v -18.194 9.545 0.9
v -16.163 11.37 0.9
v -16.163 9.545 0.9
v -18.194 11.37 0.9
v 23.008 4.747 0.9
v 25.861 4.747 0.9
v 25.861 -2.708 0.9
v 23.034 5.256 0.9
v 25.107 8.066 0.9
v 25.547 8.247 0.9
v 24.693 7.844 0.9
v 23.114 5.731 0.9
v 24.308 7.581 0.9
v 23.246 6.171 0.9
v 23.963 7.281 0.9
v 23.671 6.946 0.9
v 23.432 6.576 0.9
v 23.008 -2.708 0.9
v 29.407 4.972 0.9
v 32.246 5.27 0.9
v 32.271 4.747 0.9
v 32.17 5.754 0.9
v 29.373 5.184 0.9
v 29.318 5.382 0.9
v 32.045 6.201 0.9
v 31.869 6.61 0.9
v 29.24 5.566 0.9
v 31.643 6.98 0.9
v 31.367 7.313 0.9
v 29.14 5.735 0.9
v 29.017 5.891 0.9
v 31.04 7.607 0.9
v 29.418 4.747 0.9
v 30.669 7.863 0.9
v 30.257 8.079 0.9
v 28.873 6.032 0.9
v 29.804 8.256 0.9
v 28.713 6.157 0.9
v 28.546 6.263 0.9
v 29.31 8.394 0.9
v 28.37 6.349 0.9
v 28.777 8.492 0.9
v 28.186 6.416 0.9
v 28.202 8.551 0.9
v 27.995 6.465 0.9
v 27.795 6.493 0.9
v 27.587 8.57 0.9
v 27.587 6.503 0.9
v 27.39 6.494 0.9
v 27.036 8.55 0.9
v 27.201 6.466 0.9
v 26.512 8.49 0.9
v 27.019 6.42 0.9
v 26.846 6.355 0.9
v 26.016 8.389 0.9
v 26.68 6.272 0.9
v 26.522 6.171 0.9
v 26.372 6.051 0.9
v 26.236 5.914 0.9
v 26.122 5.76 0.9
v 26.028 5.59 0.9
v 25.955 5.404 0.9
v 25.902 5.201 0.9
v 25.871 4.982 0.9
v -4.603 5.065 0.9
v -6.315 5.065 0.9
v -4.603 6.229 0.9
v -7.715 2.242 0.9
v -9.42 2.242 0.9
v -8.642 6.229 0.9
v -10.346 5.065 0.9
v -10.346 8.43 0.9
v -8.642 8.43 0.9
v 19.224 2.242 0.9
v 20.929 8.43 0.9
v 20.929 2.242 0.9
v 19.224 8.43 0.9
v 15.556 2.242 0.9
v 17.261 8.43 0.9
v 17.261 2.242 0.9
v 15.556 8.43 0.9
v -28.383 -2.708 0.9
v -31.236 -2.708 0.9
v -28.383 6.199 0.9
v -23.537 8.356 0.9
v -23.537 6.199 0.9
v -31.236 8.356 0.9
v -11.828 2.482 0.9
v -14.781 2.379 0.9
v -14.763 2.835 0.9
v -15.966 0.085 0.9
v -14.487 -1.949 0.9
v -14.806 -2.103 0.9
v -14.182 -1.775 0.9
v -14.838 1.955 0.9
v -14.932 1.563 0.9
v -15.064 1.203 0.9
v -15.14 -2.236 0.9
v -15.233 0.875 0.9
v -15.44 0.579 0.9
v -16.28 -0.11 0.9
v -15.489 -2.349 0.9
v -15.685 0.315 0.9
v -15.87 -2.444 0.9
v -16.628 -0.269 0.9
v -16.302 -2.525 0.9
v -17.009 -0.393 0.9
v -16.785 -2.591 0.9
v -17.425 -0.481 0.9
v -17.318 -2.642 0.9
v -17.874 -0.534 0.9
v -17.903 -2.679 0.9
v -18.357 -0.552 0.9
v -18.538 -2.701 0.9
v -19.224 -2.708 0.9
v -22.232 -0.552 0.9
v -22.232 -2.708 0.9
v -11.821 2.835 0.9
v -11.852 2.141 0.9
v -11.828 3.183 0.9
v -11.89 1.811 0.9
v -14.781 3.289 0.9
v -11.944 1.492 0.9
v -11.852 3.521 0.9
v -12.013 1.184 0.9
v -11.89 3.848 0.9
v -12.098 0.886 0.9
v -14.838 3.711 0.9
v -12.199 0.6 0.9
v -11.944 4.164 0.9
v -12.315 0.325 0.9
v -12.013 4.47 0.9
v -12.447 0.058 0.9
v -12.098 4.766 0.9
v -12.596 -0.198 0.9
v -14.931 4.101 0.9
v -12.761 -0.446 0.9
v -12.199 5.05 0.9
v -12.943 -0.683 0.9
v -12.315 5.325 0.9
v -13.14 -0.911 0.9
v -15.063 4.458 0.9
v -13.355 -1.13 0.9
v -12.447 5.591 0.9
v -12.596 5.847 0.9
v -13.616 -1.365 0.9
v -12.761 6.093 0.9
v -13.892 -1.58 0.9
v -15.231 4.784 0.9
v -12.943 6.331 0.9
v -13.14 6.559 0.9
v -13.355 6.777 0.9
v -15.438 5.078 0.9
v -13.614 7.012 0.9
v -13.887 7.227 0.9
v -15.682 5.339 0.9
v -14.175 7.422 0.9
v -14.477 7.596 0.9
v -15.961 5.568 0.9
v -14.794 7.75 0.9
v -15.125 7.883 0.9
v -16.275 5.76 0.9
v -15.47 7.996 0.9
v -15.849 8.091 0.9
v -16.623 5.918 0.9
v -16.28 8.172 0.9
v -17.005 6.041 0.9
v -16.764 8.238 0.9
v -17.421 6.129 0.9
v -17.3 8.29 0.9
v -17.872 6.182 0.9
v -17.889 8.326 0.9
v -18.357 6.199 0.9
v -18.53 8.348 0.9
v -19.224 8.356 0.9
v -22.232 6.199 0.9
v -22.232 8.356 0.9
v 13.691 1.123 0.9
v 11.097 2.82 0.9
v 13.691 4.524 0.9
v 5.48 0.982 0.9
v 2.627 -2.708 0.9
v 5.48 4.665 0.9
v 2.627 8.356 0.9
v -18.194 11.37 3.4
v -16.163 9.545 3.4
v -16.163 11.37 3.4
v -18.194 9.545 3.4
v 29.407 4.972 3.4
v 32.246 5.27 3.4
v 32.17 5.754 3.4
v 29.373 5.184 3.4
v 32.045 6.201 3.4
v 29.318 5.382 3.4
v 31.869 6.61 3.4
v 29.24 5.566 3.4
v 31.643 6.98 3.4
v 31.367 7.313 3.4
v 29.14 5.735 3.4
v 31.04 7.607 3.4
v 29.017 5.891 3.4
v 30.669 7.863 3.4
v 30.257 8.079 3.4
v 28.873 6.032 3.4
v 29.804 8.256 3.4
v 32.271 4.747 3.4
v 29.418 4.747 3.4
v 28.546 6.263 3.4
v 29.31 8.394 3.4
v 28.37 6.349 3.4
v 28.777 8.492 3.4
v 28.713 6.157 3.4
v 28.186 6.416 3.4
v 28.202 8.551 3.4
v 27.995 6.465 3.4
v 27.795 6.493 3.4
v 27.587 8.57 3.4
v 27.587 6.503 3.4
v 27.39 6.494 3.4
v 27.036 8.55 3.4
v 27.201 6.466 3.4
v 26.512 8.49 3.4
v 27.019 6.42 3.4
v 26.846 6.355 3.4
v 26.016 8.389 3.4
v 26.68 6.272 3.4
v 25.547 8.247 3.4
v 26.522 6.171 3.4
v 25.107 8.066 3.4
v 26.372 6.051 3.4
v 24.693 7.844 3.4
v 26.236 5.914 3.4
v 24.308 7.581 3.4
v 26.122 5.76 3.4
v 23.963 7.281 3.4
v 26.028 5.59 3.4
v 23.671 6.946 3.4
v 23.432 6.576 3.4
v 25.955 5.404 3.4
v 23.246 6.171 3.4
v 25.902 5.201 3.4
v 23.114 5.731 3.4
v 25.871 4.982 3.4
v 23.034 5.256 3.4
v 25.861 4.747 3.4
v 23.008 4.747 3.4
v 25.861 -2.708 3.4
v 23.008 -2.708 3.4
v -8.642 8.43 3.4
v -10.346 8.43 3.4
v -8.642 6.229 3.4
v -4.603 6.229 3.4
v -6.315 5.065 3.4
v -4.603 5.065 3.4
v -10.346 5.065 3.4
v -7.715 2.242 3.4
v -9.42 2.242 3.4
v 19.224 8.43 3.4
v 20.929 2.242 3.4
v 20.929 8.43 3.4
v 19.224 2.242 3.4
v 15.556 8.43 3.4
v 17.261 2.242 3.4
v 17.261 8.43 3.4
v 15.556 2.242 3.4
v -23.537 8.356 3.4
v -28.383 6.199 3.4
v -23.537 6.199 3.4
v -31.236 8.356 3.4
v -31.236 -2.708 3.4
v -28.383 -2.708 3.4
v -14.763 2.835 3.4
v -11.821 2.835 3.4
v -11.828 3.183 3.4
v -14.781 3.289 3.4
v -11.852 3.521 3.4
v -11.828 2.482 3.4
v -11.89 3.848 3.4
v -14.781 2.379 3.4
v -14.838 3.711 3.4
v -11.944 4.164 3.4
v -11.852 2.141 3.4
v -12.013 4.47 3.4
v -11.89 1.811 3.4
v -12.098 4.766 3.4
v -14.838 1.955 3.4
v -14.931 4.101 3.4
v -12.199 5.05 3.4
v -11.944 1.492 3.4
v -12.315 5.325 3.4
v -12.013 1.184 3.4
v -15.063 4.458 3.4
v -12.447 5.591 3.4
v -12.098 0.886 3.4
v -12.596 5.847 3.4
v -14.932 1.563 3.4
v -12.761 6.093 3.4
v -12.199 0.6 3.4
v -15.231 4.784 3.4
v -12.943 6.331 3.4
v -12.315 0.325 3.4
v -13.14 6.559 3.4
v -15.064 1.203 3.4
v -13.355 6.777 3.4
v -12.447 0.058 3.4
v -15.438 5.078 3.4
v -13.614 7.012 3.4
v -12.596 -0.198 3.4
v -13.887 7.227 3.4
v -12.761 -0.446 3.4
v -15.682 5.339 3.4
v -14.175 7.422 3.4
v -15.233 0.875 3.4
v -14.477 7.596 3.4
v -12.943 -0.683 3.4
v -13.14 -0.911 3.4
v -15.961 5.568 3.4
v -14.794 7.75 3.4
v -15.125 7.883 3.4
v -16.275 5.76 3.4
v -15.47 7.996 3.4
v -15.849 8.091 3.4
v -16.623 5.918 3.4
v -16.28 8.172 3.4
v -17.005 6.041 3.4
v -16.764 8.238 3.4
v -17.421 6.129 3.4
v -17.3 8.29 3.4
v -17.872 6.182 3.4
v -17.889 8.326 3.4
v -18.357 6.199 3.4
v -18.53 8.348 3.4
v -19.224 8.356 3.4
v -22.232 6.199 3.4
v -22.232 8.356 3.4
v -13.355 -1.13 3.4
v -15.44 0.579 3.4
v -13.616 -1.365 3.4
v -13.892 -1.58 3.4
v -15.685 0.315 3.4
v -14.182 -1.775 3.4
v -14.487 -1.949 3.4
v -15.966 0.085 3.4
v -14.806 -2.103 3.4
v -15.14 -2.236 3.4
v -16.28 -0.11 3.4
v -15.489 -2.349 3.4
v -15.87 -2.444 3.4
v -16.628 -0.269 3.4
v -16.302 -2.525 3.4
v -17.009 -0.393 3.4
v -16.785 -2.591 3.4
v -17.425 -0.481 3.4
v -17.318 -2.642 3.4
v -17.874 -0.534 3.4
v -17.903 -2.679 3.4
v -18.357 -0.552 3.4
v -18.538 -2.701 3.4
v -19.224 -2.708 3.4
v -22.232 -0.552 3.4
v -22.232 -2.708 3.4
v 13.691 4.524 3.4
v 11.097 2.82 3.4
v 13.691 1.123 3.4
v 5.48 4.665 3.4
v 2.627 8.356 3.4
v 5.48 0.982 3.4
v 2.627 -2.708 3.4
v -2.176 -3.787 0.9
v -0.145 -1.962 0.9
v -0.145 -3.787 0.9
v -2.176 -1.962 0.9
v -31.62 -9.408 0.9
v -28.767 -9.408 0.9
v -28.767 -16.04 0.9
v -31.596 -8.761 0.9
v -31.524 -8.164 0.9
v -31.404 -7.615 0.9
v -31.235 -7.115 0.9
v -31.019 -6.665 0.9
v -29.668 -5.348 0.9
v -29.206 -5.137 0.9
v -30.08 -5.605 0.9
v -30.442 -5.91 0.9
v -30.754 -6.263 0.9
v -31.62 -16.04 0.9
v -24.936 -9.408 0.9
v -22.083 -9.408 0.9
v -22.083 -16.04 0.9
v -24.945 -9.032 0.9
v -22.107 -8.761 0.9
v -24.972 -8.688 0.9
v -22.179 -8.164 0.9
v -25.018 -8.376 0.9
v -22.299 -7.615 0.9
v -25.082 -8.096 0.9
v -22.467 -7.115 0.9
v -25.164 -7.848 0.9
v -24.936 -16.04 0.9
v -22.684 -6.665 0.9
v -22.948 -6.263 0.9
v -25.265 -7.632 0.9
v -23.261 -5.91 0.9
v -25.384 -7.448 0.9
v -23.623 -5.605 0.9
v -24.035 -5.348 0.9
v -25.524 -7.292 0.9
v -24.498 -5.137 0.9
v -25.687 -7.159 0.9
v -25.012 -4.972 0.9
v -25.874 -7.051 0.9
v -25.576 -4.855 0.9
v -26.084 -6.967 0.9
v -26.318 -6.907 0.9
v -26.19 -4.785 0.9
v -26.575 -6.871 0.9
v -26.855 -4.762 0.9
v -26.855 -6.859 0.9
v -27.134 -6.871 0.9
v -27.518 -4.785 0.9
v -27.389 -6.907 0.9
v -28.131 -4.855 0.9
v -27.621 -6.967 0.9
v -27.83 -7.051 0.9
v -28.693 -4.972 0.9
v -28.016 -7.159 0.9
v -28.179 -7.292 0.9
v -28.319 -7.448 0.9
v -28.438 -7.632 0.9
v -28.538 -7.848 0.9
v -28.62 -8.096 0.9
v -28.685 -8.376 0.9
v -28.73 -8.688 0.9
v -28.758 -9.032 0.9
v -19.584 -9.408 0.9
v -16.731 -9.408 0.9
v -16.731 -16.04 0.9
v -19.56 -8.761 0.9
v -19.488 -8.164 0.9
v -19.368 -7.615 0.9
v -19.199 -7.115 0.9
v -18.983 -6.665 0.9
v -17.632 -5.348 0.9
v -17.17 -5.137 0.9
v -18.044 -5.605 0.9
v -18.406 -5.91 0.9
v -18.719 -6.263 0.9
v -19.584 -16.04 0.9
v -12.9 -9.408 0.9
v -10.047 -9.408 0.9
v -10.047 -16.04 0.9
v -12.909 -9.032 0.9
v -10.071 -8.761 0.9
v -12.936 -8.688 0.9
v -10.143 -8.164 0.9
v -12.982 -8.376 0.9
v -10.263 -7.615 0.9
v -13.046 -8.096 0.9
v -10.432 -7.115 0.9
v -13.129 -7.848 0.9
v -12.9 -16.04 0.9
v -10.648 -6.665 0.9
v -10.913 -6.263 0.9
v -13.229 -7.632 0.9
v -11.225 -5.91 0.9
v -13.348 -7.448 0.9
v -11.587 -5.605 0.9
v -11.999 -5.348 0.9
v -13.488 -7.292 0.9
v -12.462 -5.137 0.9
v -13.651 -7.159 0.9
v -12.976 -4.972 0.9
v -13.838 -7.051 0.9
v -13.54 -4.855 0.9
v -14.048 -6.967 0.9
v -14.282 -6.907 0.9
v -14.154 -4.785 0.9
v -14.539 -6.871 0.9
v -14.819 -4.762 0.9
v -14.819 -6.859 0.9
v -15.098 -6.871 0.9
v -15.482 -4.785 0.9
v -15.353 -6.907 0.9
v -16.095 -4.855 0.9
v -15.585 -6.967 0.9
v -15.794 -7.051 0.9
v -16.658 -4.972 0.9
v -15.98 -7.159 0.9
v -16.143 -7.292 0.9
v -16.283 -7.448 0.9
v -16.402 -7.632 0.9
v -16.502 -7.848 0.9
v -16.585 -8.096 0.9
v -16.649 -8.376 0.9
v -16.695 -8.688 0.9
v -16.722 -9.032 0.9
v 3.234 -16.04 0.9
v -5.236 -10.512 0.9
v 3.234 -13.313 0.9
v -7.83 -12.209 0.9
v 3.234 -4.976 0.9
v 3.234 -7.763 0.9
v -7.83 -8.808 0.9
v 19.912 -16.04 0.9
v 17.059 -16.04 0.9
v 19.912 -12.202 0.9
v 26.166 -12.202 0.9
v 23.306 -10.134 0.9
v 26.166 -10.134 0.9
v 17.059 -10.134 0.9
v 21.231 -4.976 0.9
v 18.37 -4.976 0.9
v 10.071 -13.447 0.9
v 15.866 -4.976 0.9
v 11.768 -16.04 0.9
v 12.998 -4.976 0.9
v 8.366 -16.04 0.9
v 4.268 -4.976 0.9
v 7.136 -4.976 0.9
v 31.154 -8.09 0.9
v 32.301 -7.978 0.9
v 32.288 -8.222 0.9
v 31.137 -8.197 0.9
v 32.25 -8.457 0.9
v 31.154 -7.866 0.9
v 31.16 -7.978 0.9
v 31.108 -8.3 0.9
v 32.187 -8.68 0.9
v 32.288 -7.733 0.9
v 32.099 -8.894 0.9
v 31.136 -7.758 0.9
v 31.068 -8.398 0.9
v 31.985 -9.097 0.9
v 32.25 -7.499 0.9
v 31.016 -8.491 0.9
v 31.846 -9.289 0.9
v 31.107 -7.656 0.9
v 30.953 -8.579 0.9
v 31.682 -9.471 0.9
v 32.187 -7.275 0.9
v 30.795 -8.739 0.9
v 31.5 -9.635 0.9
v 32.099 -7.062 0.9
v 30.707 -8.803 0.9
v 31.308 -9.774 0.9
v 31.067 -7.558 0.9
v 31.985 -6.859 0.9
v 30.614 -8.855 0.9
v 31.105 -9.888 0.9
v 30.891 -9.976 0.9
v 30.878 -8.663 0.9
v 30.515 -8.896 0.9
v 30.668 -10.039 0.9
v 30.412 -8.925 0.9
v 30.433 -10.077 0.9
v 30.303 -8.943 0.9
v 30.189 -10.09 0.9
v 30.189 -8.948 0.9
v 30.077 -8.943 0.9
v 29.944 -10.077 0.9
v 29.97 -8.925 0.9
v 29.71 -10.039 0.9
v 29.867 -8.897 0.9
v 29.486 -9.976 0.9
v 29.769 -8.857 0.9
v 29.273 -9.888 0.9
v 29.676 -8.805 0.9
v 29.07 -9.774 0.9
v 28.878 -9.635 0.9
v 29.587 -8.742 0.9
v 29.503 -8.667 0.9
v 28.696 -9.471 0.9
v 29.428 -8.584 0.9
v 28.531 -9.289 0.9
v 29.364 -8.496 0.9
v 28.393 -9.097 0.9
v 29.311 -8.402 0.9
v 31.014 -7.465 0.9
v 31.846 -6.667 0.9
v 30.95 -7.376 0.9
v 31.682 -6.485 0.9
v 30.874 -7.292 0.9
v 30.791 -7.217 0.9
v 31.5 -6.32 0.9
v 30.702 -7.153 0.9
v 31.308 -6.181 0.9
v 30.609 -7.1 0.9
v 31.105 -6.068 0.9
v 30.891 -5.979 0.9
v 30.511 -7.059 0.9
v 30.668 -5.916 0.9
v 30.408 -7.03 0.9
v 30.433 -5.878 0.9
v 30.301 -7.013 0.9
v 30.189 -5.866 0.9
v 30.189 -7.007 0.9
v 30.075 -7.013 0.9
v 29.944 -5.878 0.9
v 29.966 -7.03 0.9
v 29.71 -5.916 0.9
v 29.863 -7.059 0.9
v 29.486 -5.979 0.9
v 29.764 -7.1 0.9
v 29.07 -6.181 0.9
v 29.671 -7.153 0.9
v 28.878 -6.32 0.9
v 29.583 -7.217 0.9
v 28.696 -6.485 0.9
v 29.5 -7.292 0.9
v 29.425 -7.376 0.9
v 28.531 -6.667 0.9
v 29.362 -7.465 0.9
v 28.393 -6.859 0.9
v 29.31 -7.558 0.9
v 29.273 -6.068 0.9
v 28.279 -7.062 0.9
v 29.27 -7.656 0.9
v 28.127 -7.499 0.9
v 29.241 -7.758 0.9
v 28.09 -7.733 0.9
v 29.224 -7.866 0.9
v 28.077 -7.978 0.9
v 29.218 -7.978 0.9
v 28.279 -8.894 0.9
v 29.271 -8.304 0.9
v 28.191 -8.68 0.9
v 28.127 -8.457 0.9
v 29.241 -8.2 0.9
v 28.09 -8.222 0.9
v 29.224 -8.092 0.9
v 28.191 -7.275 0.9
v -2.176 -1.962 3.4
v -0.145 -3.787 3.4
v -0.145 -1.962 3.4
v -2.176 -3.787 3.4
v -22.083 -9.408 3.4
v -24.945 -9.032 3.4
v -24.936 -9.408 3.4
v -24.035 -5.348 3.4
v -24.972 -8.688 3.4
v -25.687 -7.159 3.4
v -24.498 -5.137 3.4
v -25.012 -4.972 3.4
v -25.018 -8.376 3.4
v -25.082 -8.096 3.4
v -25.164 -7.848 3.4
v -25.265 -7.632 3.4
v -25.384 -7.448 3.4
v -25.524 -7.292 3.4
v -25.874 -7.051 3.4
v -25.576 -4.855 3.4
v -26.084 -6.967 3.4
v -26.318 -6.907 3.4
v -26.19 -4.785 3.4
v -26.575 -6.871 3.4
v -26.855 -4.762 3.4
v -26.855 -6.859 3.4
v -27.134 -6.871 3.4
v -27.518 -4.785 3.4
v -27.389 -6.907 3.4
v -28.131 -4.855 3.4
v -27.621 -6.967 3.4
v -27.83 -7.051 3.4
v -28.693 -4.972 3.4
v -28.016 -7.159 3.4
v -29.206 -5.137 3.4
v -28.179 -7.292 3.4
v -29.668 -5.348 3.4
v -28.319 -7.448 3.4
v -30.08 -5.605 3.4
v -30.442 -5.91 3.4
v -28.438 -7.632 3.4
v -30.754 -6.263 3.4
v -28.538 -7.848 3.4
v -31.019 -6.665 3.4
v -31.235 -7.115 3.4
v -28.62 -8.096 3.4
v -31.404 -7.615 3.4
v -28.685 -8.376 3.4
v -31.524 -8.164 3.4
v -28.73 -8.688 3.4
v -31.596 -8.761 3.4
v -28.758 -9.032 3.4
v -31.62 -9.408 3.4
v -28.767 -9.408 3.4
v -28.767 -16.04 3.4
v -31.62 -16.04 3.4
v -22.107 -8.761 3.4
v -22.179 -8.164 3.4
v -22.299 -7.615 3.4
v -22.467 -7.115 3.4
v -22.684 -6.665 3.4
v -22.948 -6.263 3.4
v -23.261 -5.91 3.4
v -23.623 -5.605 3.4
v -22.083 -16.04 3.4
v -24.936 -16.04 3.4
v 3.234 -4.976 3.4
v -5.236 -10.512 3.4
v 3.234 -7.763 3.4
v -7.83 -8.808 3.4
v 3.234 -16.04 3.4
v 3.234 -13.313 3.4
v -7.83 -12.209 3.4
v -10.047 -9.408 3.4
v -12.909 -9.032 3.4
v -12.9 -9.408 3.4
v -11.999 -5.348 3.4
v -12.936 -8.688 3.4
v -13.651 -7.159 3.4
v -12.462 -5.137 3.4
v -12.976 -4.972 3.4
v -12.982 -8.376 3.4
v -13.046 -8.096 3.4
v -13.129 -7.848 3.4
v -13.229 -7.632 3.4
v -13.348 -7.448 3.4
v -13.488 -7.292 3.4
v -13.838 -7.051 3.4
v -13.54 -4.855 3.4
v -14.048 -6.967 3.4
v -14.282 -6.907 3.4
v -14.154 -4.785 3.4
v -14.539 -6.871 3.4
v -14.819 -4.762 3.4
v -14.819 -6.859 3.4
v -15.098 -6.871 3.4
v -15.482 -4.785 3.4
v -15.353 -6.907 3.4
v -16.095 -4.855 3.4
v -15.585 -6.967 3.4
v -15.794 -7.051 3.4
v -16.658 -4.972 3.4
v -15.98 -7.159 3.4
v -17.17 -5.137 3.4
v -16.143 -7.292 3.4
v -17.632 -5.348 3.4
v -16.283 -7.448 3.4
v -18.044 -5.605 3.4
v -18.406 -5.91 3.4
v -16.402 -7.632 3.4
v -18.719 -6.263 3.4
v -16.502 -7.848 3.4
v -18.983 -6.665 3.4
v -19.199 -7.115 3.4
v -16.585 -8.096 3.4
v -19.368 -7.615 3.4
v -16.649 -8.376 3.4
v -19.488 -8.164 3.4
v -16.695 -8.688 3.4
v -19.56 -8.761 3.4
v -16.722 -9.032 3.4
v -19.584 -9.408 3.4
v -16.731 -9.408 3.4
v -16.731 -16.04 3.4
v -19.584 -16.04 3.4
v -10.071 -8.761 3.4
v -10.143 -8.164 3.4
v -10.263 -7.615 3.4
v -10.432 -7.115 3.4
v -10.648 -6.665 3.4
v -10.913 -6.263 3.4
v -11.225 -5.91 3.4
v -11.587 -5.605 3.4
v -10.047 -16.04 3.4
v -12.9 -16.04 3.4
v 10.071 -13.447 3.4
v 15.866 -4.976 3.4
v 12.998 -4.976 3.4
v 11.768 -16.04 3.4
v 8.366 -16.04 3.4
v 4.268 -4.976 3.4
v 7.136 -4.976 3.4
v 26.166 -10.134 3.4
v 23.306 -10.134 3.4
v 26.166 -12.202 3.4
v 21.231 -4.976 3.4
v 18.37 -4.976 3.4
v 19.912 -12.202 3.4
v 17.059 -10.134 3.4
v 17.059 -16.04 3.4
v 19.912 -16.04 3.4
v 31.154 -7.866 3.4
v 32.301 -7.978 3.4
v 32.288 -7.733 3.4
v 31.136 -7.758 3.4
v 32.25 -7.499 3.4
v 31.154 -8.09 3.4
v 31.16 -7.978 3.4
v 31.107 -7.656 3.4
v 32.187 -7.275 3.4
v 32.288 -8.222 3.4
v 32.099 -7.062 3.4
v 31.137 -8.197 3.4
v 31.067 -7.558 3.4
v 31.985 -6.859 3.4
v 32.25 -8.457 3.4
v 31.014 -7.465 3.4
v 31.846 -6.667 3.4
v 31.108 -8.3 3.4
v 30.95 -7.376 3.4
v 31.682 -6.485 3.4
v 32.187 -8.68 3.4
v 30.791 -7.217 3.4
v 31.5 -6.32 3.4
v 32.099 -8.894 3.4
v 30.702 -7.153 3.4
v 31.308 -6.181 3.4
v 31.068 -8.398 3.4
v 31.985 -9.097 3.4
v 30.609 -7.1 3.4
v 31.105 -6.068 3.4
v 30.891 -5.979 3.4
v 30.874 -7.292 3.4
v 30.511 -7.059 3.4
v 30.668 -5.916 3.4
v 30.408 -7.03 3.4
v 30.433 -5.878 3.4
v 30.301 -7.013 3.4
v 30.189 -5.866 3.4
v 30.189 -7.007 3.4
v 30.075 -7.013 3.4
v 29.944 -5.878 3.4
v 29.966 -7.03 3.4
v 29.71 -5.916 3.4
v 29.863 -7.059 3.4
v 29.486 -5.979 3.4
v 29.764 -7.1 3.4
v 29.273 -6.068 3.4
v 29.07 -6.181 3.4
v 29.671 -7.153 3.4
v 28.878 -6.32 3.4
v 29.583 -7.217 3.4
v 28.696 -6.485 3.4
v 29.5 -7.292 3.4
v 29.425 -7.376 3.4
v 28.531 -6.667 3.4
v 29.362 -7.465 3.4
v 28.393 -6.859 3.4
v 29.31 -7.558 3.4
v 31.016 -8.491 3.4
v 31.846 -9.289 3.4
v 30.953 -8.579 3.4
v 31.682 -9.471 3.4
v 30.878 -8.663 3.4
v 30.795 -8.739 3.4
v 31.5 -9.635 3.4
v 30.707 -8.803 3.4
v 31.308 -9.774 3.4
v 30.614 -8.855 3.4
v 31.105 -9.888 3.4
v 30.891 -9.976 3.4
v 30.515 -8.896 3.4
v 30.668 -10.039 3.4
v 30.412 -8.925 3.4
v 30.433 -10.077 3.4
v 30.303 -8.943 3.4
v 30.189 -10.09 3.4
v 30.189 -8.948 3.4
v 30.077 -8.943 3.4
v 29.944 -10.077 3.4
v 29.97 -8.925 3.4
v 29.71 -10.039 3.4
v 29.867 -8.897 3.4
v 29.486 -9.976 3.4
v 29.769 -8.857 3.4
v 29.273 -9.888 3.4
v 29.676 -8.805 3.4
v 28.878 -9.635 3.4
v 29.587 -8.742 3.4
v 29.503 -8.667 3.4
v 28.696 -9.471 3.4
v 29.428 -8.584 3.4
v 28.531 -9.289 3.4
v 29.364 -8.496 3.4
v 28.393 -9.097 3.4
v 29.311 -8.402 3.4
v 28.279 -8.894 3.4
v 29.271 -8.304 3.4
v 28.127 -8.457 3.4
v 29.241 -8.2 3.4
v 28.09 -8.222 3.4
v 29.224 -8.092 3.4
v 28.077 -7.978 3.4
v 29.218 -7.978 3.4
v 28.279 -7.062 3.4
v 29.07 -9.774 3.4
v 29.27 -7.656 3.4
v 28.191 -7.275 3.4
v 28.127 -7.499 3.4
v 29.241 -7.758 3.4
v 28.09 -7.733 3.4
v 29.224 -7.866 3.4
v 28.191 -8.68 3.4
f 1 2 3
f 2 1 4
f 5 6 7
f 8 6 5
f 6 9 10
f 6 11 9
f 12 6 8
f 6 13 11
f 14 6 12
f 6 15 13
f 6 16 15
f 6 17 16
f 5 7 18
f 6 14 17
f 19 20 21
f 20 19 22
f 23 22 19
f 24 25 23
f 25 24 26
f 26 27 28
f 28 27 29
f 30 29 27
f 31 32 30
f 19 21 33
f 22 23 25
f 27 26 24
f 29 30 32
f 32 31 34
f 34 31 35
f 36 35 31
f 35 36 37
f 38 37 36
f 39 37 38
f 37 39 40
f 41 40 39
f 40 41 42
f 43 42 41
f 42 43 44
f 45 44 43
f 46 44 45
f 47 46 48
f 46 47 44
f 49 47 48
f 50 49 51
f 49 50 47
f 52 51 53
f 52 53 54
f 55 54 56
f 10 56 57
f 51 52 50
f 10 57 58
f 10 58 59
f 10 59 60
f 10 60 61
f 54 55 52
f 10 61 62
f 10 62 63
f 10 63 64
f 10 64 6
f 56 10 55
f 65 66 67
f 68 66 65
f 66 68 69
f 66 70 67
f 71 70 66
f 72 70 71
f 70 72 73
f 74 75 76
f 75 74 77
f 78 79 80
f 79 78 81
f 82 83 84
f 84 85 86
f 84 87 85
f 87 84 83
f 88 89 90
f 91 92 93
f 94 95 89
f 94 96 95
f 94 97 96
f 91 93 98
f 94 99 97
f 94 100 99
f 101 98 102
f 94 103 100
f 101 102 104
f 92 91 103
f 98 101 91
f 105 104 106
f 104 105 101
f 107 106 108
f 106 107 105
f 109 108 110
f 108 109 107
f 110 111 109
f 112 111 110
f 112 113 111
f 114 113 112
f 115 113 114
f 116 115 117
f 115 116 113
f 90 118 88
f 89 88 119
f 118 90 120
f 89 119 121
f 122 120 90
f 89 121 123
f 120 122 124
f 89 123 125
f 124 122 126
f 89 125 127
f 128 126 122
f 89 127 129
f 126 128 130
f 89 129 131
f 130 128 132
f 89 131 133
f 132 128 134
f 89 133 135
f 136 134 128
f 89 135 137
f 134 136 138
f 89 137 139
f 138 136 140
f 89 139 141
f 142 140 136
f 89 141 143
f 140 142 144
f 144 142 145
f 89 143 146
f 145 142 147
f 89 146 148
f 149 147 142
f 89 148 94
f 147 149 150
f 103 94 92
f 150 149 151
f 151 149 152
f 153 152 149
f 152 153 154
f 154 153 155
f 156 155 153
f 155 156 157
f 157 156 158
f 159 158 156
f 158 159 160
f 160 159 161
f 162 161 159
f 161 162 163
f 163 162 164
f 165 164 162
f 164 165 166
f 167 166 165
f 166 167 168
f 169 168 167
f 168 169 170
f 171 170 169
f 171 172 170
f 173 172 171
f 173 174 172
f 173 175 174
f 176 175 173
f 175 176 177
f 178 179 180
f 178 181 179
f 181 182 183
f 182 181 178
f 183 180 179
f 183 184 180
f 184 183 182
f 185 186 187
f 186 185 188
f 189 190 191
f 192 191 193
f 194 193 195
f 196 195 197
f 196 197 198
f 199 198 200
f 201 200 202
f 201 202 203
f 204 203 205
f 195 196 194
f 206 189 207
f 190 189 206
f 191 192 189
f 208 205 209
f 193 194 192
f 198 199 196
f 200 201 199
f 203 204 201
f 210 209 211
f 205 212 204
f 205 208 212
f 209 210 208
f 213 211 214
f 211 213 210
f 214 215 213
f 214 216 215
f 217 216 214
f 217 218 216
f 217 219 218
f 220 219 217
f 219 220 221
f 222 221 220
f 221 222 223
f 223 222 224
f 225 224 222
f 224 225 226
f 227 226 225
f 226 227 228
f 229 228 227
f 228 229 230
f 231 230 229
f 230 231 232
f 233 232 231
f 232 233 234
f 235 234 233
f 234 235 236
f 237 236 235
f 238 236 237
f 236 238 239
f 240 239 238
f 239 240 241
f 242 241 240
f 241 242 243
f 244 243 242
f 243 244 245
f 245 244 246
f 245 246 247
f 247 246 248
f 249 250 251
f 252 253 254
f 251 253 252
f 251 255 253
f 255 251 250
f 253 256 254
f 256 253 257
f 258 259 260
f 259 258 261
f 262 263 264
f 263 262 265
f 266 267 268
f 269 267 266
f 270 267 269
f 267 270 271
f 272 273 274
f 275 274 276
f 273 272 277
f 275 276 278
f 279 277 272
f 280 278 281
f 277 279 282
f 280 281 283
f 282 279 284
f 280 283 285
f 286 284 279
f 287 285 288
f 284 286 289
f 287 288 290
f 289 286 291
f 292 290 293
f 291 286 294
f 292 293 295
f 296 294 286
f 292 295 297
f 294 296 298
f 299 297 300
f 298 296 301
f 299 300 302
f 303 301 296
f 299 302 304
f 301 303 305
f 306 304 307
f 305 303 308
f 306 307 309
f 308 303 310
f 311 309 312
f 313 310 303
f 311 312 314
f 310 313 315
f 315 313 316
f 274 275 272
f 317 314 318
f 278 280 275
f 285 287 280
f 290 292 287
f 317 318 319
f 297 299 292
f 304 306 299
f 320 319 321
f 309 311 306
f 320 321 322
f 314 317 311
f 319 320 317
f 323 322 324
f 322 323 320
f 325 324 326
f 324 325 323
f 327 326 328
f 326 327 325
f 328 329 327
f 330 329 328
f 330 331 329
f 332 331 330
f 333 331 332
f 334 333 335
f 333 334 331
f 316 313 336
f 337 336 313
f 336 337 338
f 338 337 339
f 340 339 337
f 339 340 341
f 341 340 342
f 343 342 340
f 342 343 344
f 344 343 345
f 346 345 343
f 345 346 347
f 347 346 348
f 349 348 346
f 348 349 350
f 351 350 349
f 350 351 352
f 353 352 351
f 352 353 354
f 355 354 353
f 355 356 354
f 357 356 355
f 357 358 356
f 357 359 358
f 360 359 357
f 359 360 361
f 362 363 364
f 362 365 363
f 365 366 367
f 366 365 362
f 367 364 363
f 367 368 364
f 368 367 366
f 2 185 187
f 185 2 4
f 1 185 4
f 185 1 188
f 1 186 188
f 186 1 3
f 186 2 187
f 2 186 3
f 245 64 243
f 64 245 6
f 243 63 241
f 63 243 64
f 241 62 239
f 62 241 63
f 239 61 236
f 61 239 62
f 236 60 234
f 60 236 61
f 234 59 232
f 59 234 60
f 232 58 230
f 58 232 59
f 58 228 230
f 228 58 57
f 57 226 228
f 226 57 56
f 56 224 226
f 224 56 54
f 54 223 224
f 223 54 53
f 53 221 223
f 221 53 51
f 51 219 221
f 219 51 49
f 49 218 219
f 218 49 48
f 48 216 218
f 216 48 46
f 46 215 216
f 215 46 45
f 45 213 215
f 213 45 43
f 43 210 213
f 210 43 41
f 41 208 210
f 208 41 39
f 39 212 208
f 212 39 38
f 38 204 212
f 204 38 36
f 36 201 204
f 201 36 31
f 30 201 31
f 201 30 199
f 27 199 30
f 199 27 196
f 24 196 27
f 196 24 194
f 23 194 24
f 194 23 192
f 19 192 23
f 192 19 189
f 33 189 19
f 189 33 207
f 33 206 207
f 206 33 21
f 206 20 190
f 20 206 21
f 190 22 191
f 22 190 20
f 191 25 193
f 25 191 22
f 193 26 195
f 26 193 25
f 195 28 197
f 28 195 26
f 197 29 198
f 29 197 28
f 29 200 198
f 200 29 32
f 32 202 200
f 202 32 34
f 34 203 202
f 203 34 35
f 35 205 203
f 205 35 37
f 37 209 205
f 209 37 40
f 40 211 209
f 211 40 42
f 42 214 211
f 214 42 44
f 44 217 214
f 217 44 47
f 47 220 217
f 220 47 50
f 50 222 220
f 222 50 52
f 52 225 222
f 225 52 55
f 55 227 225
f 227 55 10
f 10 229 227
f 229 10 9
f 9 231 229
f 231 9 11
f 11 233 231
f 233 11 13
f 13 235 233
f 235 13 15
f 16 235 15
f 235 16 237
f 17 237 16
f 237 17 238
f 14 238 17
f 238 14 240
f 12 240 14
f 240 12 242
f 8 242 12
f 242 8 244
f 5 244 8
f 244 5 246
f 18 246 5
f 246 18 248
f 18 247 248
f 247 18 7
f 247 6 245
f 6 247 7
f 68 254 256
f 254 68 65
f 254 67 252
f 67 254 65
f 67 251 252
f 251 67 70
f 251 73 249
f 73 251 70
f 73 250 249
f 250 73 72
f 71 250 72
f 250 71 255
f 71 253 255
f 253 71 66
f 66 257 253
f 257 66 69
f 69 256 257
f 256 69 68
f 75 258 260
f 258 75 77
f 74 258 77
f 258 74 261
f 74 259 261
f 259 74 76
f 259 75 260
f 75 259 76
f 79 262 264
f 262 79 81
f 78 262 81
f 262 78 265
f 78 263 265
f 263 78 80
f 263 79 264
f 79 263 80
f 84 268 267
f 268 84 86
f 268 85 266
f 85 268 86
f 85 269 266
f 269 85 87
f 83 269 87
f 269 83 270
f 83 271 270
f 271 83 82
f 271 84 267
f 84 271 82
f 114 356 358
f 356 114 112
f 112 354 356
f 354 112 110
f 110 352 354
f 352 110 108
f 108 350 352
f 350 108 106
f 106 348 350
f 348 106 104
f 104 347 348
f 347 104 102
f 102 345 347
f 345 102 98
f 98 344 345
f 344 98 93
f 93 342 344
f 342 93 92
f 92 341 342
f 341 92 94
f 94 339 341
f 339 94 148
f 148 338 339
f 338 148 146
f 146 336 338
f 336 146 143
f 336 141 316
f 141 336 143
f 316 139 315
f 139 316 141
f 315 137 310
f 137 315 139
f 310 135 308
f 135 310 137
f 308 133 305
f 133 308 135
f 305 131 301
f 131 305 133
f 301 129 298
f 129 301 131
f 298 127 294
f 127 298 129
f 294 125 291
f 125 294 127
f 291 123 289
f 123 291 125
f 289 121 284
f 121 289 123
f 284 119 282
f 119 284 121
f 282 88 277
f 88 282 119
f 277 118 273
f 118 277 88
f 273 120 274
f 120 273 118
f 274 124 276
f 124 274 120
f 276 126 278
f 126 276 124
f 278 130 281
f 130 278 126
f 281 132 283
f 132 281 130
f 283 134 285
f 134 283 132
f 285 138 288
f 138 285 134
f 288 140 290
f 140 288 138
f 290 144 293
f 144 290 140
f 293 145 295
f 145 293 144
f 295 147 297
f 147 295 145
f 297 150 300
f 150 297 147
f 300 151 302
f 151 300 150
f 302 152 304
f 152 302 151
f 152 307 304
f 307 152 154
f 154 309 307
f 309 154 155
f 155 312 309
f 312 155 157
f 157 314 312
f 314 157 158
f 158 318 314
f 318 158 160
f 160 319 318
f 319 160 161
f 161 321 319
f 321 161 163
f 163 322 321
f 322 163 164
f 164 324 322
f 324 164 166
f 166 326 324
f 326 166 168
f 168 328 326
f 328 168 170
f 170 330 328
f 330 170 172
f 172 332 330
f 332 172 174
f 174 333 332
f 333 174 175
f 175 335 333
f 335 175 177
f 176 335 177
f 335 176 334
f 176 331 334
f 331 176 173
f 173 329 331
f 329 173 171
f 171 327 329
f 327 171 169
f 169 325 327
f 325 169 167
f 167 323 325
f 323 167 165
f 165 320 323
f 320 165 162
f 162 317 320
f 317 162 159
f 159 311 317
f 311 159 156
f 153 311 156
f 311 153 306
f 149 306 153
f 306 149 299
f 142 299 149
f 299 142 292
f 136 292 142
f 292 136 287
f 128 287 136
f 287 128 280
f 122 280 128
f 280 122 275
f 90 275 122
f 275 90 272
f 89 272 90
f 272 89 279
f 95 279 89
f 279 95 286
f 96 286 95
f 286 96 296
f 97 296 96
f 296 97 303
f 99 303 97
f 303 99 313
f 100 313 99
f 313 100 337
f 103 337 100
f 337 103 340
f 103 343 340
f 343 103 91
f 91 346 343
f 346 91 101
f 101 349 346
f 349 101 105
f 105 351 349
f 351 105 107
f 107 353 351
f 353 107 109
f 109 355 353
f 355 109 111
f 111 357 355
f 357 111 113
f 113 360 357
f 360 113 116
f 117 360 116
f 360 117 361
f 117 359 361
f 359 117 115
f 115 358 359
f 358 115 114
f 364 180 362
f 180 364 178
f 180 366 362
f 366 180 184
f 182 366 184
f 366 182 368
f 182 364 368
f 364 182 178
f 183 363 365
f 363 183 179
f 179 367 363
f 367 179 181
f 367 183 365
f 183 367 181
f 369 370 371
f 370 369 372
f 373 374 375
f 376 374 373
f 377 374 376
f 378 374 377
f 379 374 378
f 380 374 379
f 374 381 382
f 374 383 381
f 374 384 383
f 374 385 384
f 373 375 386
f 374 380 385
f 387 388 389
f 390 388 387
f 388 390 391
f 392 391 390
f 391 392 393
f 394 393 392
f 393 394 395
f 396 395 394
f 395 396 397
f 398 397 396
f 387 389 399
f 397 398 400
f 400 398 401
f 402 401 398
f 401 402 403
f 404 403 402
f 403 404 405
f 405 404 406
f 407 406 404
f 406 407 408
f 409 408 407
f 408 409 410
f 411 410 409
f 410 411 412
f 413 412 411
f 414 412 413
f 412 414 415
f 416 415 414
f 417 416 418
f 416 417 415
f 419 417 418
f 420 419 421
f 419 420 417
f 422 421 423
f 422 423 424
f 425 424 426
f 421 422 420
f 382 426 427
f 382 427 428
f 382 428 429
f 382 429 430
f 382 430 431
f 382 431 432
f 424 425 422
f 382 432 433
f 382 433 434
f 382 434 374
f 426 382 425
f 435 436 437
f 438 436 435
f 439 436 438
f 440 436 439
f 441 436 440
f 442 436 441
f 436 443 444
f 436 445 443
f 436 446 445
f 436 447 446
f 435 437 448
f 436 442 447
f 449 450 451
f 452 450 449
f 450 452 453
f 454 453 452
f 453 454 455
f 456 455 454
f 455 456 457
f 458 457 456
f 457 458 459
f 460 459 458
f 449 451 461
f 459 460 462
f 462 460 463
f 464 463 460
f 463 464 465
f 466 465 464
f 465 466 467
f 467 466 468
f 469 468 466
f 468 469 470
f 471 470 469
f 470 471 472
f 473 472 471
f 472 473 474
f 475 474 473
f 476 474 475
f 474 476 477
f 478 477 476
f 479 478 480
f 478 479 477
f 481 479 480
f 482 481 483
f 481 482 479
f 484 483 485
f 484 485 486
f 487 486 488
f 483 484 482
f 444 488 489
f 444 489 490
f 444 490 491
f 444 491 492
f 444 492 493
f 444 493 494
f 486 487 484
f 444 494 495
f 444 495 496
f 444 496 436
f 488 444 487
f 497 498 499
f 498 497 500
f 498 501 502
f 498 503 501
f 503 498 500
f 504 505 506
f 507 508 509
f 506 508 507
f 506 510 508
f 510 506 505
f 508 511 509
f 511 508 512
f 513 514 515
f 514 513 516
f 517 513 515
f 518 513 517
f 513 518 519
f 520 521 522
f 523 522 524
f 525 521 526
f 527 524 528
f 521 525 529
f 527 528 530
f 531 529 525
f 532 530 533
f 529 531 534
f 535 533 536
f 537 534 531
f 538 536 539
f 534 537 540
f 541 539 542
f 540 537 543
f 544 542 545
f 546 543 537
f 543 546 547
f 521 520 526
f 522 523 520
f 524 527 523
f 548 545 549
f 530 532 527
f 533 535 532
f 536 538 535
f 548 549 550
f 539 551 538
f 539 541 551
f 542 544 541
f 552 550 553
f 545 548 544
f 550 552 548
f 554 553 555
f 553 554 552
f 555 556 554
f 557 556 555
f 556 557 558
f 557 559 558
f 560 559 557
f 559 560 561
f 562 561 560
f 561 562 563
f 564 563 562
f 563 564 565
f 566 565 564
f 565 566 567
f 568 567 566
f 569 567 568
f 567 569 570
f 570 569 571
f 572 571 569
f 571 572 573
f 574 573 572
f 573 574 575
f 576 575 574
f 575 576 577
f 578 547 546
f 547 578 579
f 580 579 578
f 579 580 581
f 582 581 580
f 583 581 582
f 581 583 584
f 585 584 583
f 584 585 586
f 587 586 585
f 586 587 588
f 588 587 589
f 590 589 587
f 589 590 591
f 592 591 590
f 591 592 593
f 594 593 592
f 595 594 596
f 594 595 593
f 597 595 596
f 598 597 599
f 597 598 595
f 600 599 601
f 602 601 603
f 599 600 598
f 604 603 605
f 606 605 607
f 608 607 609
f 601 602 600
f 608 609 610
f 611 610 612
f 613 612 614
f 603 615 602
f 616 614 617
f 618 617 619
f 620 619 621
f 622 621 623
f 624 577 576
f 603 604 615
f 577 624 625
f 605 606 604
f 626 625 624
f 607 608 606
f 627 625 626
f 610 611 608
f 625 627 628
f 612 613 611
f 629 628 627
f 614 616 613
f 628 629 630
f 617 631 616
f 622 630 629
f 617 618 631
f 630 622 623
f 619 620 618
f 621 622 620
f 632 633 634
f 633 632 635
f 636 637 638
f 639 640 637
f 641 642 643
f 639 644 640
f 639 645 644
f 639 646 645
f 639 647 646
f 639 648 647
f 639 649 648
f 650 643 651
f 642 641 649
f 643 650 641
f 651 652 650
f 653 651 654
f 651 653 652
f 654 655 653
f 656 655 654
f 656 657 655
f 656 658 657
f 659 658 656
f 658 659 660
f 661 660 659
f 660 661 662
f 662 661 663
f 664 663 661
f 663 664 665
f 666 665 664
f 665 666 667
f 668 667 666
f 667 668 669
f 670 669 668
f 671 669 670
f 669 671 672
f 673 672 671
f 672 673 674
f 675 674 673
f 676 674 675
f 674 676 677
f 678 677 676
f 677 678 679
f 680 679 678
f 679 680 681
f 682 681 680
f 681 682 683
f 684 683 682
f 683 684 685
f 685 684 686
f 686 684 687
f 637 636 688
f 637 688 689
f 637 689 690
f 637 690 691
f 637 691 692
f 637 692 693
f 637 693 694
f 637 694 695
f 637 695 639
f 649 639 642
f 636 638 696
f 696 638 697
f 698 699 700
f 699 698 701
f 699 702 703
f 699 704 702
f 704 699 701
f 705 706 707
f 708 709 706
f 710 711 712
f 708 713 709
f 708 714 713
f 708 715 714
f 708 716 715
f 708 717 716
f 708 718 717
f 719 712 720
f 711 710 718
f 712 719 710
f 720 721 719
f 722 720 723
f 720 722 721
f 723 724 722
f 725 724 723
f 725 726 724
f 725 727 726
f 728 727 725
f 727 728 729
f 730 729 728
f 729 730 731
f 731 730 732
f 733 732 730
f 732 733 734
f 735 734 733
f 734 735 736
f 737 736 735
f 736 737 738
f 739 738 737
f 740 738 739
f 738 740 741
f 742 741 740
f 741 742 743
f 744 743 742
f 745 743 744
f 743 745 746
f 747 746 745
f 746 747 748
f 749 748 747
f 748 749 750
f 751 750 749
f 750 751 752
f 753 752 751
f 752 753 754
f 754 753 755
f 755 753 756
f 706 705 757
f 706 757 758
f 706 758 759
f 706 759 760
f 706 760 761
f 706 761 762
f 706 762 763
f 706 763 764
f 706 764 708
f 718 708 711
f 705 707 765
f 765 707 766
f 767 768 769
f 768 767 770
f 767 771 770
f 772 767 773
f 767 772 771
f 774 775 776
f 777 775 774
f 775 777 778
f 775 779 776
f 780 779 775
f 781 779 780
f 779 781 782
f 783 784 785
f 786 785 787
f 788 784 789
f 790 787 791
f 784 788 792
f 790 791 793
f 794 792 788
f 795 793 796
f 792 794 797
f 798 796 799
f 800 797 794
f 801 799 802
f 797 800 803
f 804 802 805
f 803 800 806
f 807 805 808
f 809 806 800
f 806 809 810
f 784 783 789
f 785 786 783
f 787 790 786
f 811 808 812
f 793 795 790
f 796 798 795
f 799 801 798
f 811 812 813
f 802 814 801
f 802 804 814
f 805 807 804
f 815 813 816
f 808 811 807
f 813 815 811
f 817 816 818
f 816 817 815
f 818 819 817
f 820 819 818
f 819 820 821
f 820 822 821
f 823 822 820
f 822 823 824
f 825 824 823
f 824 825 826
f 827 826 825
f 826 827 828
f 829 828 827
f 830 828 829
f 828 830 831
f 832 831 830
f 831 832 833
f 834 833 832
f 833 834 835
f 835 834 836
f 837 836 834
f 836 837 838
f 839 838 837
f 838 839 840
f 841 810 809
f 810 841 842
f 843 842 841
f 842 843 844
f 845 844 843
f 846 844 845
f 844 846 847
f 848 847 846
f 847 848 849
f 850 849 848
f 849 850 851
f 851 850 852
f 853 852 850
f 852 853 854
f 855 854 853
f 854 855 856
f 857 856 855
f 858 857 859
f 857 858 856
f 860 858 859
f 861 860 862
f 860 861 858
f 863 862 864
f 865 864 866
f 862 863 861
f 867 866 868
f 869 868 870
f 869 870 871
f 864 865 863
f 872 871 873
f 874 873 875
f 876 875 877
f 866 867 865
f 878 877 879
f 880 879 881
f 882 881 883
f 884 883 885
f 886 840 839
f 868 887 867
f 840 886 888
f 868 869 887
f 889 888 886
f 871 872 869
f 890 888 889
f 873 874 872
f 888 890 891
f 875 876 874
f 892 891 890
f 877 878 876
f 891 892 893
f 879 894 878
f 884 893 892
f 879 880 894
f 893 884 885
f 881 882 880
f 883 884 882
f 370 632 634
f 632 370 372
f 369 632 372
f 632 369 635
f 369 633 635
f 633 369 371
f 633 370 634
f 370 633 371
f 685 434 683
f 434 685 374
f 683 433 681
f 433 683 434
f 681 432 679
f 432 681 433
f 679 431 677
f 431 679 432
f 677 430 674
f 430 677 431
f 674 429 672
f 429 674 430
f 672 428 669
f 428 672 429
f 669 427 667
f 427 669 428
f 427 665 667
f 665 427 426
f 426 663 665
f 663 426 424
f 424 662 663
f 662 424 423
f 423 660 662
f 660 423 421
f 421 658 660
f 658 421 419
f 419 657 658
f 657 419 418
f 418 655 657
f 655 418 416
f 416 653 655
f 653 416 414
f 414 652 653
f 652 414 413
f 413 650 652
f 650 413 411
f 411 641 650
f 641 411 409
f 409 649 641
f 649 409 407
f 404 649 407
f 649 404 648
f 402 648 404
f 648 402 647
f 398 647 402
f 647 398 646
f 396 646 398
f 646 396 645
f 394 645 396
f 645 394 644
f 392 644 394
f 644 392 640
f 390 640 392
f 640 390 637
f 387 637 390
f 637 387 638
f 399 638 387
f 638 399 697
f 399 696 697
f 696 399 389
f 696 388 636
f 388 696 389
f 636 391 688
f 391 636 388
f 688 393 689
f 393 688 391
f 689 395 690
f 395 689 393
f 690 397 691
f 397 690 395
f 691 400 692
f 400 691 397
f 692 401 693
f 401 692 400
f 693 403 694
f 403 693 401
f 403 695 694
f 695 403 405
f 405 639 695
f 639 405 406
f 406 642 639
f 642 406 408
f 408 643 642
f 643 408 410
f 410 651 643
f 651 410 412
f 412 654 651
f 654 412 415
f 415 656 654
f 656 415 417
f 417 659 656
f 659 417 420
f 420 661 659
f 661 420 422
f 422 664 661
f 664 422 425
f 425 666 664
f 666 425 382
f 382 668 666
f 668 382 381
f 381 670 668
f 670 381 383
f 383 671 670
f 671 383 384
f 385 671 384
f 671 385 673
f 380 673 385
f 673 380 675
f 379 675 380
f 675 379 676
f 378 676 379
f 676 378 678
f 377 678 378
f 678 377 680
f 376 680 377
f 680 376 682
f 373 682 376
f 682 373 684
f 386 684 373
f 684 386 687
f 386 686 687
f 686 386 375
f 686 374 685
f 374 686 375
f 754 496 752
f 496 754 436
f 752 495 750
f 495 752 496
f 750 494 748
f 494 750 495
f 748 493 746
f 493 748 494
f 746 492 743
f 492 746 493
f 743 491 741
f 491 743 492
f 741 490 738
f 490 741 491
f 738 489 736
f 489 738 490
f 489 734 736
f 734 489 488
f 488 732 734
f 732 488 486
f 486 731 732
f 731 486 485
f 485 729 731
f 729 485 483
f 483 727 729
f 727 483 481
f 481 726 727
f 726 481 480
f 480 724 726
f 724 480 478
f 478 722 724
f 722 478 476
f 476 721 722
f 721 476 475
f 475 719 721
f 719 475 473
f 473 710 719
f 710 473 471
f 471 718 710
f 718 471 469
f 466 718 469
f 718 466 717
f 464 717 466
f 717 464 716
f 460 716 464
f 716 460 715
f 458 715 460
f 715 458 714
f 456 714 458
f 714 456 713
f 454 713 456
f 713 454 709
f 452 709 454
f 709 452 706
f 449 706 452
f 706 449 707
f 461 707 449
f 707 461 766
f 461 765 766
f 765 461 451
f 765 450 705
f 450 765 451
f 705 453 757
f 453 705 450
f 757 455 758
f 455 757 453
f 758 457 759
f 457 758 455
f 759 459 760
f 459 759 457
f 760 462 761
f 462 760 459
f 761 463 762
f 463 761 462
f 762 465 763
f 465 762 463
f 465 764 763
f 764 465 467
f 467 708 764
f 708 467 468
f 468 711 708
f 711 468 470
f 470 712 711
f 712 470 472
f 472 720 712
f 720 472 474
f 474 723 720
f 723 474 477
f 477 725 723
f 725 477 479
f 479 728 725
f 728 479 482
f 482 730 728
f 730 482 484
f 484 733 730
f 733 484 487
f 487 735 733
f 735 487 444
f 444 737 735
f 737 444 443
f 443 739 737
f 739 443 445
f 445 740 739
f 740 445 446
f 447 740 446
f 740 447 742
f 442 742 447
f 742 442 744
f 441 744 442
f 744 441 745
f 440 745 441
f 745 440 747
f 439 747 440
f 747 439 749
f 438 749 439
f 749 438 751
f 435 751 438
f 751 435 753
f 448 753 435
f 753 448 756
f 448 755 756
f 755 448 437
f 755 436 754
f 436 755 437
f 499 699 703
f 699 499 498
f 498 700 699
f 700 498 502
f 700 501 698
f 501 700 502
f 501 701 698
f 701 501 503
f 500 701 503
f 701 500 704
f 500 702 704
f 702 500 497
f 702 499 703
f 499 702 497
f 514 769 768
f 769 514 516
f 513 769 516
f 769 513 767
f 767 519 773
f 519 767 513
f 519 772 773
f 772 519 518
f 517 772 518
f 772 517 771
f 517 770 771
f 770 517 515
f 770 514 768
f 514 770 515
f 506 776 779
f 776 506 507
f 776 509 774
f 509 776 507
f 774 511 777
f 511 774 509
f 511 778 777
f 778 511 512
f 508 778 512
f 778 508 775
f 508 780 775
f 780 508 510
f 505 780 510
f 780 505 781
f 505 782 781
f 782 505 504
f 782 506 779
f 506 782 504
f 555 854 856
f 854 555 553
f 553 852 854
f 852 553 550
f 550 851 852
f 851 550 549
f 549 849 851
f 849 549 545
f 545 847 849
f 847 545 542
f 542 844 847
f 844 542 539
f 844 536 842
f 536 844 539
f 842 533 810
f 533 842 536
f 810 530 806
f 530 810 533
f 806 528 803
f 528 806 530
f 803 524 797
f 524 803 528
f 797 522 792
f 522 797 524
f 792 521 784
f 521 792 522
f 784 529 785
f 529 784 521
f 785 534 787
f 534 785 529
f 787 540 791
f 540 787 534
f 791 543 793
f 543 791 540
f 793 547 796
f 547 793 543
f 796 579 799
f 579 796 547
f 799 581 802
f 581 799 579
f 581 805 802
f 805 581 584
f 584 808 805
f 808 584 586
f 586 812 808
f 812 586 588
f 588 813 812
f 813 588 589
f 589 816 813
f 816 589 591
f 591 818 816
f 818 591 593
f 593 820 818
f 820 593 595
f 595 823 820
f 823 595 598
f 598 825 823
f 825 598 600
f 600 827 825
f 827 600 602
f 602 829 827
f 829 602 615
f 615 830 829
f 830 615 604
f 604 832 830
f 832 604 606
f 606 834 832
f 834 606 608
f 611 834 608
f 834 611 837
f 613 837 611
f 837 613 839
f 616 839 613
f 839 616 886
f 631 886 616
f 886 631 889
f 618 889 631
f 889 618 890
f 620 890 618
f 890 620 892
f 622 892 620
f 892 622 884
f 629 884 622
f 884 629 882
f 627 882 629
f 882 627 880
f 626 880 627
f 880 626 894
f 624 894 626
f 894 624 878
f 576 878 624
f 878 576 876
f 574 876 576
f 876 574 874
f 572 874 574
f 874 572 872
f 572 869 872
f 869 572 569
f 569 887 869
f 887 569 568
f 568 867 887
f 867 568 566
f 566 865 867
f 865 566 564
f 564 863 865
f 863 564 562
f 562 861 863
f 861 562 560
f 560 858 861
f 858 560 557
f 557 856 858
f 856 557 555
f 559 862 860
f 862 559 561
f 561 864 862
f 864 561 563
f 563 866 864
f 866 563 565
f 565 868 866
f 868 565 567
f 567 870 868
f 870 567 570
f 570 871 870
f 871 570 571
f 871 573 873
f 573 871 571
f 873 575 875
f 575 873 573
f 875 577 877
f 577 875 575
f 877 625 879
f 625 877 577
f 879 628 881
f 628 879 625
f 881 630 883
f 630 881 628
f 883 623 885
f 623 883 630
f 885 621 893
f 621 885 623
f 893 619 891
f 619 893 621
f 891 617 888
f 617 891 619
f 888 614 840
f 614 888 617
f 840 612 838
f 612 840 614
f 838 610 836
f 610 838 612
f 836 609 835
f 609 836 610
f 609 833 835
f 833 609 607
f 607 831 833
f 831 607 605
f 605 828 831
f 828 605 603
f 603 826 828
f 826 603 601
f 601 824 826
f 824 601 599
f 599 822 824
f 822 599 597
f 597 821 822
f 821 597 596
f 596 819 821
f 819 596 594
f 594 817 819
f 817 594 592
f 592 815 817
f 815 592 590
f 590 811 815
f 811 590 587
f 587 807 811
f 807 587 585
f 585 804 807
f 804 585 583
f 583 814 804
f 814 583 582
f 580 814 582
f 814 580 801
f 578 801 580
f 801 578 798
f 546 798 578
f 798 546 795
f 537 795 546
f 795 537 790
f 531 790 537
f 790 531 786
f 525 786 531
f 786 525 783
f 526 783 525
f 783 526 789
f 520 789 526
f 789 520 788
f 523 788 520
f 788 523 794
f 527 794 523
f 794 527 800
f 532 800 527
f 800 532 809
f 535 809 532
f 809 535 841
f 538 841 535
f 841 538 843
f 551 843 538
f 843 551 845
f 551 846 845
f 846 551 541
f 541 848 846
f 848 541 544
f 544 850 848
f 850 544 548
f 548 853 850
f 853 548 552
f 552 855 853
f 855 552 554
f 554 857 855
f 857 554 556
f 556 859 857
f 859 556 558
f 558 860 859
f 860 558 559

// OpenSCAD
$fn = 48;
  // syllabics (overlaid on icon, tallest)
  translate([0, 4.166, 0.900]) linear_extrude(height=2.500) text("ᒥᑑᔾ ᐅᐦᒋ", size=10.928, halign="center", valign="center", font="Euphemia UCAS:style=Bold");
  translate([0, -9.166, 0.900]) linear_extrude(height=2.500) text("ᑎᑎᐹᐯᔨᐤ", size=10.928, halign="center", valign="center", font="Euphemia UCAS:style=Bold");
